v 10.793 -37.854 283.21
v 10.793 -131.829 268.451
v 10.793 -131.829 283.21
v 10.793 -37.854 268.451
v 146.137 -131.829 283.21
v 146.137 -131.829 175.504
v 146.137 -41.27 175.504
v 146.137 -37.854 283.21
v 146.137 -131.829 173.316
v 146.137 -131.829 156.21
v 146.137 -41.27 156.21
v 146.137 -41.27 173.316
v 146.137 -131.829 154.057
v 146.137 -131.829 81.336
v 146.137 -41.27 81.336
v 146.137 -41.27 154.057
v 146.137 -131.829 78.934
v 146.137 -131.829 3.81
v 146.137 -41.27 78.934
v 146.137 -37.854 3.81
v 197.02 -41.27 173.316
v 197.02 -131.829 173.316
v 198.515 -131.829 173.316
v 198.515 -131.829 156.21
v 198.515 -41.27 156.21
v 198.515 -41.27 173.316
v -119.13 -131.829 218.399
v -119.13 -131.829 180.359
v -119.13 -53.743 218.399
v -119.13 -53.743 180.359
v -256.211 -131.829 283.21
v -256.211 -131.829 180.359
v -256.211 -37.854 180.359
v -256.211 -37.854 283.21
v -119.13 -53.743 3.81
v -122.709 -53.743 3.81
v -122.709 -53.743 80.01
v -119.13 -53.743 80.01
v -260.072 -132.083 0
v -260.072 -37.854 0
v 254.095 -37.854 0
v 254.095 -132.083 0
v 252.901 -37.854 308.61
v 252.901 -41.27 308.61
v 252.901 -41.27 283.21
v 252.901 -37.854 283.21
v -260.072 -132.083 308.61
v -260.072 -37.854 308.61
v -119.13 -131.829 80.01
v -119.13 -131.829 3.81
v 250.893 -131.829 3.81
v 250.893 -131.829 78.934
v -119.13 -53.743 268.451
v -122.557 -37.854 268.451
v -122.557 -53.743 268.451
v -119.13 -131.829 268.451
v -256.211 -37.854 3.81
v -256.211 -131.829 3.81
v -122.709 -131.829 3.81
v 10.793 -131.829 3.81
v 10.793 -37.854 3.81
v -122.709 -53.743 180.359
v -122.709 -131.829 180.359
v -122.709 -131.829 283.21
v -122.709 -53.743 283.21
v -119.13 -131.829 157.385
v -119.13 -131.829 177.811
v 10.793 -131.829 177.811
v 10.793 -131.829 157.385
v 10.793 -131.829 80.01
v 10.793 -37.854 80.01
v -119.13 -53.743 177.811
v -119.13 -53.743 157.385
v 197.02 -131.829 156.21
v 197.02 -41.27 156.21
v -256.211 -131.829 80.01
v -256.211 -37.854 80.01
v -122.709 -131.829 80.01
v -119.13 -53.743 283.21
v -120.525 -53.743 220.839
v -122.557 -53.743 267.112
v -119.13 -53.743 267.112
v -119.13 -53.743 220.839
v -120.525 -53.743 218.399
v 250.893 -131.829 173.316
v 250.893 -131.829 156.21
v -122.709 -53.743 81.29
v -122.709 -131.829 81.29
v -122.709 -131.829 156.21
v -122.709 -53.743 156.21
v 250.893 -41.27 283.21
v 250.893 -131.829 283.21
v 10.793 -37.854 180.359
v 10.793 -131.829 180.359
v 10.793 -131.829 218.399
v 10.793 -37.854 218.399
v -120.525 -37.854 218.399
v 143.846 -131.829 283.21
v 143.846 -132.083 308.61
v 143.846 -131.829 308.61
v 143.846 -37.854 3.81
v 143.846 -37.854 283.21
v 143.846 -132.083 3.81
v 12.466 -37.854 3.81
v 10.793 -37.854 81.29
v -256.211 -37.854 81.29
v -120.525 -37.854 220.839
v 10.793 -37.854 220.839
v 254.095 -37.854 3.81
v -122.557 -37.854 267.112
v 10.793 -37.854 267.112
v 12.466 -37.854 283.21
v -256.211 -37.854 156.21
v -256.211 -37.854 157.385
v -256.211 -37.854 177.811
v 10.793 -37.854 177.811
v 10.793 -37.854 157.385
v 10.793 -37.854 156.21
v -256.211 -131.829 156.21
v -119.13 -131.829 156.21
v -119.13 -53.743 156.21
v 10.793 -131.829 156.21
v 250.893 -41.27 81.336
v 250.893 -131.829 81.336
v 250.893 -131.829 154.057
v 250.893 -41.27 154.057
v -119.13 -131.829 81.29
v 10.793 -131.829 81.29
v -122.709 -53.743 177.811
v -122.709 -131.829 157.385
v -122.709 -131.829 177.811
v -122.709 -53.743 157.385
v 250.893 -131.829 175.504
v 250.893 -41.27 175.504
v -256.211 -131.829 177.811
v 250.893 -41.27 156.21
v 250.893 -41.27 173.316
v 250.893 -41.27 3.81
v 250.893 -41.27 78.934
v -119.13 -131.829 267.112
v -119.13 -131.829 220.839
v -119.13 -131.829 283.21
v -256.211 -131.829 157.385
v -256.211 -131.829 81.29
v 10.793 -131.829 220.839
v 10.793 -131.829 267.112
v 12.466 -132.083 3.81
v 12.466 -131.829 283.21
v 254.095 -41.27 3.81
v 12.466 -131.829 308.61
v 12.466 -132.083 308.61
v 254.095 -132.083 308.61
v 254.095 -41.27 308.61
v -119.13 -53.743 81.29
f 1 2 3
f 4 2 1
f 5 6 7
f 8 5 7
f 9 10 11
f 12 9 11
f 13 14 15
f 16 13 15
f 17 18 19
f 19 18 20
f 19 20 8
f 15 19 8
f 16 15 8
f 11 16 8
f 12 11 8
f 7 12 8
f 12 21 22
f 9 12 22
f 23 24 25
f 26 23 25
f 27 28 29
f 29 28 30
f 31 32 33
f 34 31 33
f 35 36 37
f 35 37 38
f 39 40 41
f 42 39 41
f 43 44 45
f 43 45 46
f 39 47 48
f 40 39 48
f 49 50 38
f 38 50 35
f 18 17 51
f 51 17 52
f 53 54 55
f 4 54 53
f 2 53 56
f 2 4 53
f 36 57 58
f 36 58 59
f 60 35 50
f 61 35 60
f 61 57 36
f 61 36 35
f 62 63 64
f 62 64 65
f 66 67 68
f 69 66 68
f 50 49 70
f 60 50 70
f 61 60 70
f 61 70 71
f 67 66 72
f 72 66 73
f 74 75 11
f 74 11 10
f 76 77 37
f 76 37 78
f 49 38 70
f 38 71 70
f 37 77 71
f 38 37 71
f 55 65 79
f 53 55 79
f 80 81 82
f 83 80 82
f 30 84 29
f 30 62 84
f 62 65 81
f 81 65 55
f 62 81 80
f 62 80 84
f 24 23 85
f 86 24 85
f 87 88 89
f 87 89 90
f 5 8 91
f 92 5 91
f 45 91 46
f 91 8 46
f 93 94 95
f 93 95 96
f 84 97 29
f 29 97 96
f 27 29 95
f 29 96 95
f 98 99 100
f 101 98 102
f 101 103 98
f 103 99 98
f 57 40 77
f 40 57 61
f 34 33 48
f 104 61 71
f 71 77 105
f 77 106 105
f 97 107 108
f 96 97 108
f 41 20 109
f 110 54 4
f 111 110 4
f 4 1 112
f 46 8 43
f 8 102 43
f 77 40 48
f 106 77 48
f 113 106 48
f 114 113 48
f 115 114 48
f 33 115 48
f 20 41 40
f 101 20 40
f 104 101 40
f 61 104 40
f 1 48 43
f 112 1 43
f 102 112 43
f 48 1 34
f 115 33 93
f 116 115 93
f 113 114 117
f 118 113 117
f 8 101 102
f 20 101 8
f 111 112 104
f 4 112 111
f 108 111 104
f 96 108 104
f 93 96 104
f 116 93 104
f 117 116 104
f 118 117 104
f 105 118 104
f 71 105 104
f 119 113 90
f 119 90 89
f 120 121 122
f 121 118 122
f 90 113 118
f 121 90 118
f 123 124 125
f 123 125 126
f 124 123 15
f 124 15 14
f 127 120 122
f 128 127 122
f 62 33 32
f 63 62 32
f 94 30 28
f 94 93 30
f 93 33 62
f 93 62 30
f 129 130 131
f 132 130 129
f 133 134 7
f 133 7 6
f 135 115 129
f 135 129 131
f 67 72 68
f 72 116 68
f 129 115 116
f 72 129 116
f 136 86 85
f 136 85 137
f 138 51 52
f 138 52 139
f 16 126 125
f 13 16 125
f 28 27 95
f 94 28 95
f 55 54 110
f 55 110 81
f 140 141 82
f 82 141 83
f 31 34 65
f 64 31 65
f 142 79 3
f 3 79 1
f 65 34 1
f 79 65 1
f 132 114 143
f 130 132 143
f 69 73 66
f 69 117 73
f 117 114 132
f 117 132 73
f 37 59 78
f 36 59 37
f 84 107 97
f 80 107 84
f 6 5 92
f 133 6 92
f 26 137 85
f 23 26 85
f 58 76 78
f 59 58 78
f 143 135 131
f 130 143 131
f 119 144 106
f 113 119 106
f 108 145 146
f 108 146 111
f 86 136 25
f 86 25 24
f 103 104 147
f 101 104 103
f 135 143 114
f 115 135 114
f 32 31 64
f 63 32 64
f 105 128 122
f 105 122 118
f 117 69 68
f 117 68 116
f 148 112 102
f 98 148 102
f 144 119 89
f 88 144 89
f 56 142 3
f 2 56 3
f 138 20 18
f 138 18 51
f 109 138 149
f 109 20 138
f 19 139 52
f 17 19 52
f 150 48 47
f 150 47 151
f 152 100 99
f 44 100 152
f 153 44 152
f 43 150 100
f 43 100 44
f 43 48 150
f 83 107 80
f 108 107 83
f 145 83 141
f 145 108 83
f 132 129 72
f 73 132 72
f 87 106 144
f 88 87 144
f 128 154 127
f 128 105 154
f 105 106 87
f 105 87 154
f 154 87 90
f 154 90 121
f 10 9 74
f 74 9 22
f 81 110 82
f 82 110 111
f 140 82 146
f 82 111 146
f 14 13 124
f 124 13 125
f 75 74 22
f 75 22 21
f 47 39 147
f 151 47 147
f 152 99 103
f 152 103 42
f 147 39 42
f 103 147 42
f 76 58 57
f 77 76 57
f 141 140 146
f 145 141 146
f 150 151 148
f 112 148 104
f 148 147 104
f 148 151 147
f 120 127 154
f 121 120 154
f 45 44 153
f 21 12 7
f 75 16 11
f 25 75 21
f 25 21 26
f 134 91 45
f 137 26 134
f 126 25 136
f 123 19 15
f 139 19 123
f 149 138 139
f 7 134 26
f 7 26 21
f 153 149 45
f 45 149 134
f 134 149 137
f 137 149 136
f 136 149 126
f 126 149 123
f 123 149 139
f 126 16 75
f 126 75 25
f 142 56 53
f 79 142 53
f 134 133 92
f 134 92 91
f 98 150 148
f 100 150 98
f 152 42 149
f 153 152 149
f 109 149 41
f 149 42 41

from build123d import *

# Parameters (mm, degrees)
F0_W      = 514.1673088074
F0_H      = 94.2290462554
F1_DEPTH  = 3.81
F2_W      = 2.2902190685
F2_H      = 94.2290462554
F3_DEPTH  = 304.8
F4_W      = 3.202021122
F4_H      = 90.812921524
F5_DEPTH  = 304.8
F6_W      = 1.6730939969
F6_H      = 94.2290462554
F7_DEPTH  = 304.8
F8_W      = 3.8608312607
F8_H      = 94.2290462554
F9_DEPTH  = 304.8
F10_W     = 3.5790838301
F10_H     = 78.3394947648
F11_DEPTH = 304.8
F12_W     = 272.5380798802
F12_H     = 308.61
F13_DEPTH = 0.254
F14_W     = 110.2488040924
F14_H     = 308.61
F15_DEPTH = 0.254
F16_W     = 90.558921524
F16_H     = 2.1528995848
F17_DEPTH = 105.41
F18_W     = 90.558921524
F18_H     = 2.4020688844
F19_DEPTH = 106.934
F20_W     = 90.558921524
F20_H     = 2.1886378527
F21_DEPTH = 106.934
F22_W     = 1.4953613281
F22_H     = 90.558921524
F23_DEPTH = 18.542
F24_R     = 2.7883656223
F25_DEPTH = 106.68
F26_W     = 93.9750462554
F26_H     = 1.1749916458
F27_DEPTH = 268.224
F28_W     = 93.9750462554
F28_H     = 2.5478154421
F29_DEPTH = 270.256
F30_W     = 93.9750462554
F30_H     = 1.2798203731
F31_DEPTH = 269.24
F32_W     = 93.9750462554
F32_H     = 1.3391077518
F33_DEPTH = 133.35
F34_W     = 93.9750462554
F34_H     = 2.4402439594
F35_DEPTH = 131.318
F36_R     = 1.6466720005
F37_DEPTH = 136.906
F38_W     = 512.9730403423
F38_H     = 93.9750462554
F39_DEPTH = 25.4


with BuildPart() as f1:
    # F0 (on Top) → F1 (new body)
    with BuildSketch(Plane.XY):
        with Locations((-2.9884278774, -84.9680285901)):
            Rectangle(F0_W, F0_H)
    extrude(amount=F1_DEPTH)

    # F2 (on face) → F3 (join)
    with BuildSketch(Plane.XY.offset(3.81)):
        with Locations((144.9915319681, -84.9680285901)):
            Rectangle(F2_W, F2_H)
    extrude(amount=F3_DEPTH)

    # F4 (on face) → F5 (join)
    with BuildSketch(Plane.XY.offset(3.81)):
        with Locations((252.4942159653, -86.6760909557)):
            Rectangle(F4_W, F4_H)
    extrude(amount=F5_DEPTH)

    # F6 (on face) → F7 (join)
    with BuildSketch(Plane.XY.offset(3.81)):
        with Locations((11.6294506006, -84.9680285901)):
            Rectangle(F6_W, F6_H)
    extrude(amount=F7_DEPTH)

    # F8 (on face) → F9 (join)
    with BuildSketch(Plane.XY.offset(3.81)):
        with Locations((-258.1416666508, -84.9680285901)):
            Rectangle(F8_W, F8_H)
    extrude(amount=F9_DEPTH)

    # F10 (on face) → F11 (join)
    with BuildSketch(Plane.XY.offset(3.81)):
        with Locations((-120.9196317941, -92.9128043354)):
            Rectangle(F10_W, F10_H)
    extrude(amount=F11_DEPTH)

    # F12 (on face) → F13 (join)
    with BuildSketch(Plane.XZ.offset(132.0825517178)):
        with Locations((-123.803042341, 154.305)):
            Rectangle(F12_W, F12_H)
    extrude(amount=-F13_DEPTH)

    # F14 (on face) → F15 (join)
    with BuildSketch(Plane.XZ.offset(132.0825517178)):
        with Locations((198.9708244801, 154.305)):
            Rectangle(F14_W, F14_H)
    extrude(amount=-F15_DEPTH)

    # F16 (on face) → F17 (join)
    with BuildSketch(Plane(origin=(250.8932054043, 0, 0), x_dir=(0, -1, 0), z_dir=(-1, 0, 0))):
        with Locations((86.5490909557, 155.1335502076)):
            Rectangle(F16_W, F16_H)
    extrude(amount=F17_DEPTH)

    # F18 (on face) → F19 (join)
    with BuildSketch(Plane(origin=(250.8932054043, 0, 0), x_dir=(0, -1, 0), z_dir=(-1, 0, 0))):
        with Locations((86.5490909557, 80.1345846498)):
            Rectangle(F18_W, F18_H)
    extrude(amount=F19_DEPTH)

    # F20 (on face) → F21 (join)
    with BuildSketch(Plane(origin=(250.8932054043, 0, 0), x_dir=(0, -1, 0), z_dir=(-1, 0, 0))):
        with Locations((86.5490909557, 174.4099780917)):
            Rectangle(F20_W, F20_H)
    extrude(amount=F21_DEPTH)

    # F22 (on face) → F23 (join)
    with BuildSketch(Plane.XY.offset(156.21)):
        with Locations((197.7672427893, -86.5490909557)):
            Rectangle(F22_W, F22_H)
    extrude(amount=F23_DEPTH)

    # F24 (on face) → F25 (join)
    with BuildSketch(Plane(origin=(250.8932054043, 0, 0), x_dir=(0, -1, 0), z_dir=(-1, 0, 0))):
        with Locations((86.5490909557, 288.2337272167)):
            Circle(F24_R)
    extrude(amount=F25_DEPTH)

    # F26 (on face) → F27 (join)
    with BuildSketch(Plane(origin=(10.7929036021, 0, 0), x_dir=(0, -1, 0), z_dir=(-1, 0, 0))):
        with Locations((84.8410285901, 156.7974958229)):
            Rectangle(F26_W, F26_H)
    extrude(amount=F27_DEPTH)

    # F28 (on face) → F29 (join)
    with BuildSketch(Plane(origin=(10.7929036021, 0, 0), x_dir=(0, -1, 0), z_dir=(-1, 0, 0))):
        with Locations((84.8410285901, 179.0851131082)):
            Rectangle(F28_W, F28_H)
    extrude(amount=F29_DEPTH)

    # F30 (on face) → F31 (join)
    with BuildSketch(Plane(origin=(10.7929036021, 0, 0), x_dir=(0, -1, 0), z_dir=(-1, 0, 0))):
        with Locations((84.8410285901, 80.6499101865)):
            Rectangle(F30_W, F30_H)
    extrude(amount=F31_DEPTH)

    # F32 (on face) → F33 (join)
    with BuildSketch(Plane(origin=(10.7929036021, 0, 0), x_dir=(0, -1, 0), z_dir=(-1, 0, 0))):
        with Locations((84.8410285901, 267.7811831236)):
            Rectangle(F32_W, F32_H)
    extrude(amount=F33_DEPTH)

    # F34 (on face) → F35 (join)
    with BuildSketch(Plane(origin=(10.7929036021, 0, 0), x_dir=(0, -1, 0), z_dir=(-1, 0, 0))):
        with Locations((84.8410285901, 219.618961215)):
            Rectangle(F34_W, F34_H)
    extrude(amount=F35_DEPTH)

    # F36 (on face) → F37 (join)
    with BuildSketch(Plane(origin=(-122.7091737092, 0, 0), x_dir=(0, -1, 0), z_dir=(-1, 0, 0))):
        with Locations((94.4481417537, 294.7028875351)):
            Circle(F36_R)
    extrude(amount=F37_DEPTH)

    # F38 (on face) → F39 (join)
    with BuildSketch(Plane.XY.offset(308.61)):
        with Locations((-3.5855621099, -84.8410285901)):
            Rectangle(F38_W, F38_H)
    extrude(amount=-F39_DEPTH)


solid = f1.part
